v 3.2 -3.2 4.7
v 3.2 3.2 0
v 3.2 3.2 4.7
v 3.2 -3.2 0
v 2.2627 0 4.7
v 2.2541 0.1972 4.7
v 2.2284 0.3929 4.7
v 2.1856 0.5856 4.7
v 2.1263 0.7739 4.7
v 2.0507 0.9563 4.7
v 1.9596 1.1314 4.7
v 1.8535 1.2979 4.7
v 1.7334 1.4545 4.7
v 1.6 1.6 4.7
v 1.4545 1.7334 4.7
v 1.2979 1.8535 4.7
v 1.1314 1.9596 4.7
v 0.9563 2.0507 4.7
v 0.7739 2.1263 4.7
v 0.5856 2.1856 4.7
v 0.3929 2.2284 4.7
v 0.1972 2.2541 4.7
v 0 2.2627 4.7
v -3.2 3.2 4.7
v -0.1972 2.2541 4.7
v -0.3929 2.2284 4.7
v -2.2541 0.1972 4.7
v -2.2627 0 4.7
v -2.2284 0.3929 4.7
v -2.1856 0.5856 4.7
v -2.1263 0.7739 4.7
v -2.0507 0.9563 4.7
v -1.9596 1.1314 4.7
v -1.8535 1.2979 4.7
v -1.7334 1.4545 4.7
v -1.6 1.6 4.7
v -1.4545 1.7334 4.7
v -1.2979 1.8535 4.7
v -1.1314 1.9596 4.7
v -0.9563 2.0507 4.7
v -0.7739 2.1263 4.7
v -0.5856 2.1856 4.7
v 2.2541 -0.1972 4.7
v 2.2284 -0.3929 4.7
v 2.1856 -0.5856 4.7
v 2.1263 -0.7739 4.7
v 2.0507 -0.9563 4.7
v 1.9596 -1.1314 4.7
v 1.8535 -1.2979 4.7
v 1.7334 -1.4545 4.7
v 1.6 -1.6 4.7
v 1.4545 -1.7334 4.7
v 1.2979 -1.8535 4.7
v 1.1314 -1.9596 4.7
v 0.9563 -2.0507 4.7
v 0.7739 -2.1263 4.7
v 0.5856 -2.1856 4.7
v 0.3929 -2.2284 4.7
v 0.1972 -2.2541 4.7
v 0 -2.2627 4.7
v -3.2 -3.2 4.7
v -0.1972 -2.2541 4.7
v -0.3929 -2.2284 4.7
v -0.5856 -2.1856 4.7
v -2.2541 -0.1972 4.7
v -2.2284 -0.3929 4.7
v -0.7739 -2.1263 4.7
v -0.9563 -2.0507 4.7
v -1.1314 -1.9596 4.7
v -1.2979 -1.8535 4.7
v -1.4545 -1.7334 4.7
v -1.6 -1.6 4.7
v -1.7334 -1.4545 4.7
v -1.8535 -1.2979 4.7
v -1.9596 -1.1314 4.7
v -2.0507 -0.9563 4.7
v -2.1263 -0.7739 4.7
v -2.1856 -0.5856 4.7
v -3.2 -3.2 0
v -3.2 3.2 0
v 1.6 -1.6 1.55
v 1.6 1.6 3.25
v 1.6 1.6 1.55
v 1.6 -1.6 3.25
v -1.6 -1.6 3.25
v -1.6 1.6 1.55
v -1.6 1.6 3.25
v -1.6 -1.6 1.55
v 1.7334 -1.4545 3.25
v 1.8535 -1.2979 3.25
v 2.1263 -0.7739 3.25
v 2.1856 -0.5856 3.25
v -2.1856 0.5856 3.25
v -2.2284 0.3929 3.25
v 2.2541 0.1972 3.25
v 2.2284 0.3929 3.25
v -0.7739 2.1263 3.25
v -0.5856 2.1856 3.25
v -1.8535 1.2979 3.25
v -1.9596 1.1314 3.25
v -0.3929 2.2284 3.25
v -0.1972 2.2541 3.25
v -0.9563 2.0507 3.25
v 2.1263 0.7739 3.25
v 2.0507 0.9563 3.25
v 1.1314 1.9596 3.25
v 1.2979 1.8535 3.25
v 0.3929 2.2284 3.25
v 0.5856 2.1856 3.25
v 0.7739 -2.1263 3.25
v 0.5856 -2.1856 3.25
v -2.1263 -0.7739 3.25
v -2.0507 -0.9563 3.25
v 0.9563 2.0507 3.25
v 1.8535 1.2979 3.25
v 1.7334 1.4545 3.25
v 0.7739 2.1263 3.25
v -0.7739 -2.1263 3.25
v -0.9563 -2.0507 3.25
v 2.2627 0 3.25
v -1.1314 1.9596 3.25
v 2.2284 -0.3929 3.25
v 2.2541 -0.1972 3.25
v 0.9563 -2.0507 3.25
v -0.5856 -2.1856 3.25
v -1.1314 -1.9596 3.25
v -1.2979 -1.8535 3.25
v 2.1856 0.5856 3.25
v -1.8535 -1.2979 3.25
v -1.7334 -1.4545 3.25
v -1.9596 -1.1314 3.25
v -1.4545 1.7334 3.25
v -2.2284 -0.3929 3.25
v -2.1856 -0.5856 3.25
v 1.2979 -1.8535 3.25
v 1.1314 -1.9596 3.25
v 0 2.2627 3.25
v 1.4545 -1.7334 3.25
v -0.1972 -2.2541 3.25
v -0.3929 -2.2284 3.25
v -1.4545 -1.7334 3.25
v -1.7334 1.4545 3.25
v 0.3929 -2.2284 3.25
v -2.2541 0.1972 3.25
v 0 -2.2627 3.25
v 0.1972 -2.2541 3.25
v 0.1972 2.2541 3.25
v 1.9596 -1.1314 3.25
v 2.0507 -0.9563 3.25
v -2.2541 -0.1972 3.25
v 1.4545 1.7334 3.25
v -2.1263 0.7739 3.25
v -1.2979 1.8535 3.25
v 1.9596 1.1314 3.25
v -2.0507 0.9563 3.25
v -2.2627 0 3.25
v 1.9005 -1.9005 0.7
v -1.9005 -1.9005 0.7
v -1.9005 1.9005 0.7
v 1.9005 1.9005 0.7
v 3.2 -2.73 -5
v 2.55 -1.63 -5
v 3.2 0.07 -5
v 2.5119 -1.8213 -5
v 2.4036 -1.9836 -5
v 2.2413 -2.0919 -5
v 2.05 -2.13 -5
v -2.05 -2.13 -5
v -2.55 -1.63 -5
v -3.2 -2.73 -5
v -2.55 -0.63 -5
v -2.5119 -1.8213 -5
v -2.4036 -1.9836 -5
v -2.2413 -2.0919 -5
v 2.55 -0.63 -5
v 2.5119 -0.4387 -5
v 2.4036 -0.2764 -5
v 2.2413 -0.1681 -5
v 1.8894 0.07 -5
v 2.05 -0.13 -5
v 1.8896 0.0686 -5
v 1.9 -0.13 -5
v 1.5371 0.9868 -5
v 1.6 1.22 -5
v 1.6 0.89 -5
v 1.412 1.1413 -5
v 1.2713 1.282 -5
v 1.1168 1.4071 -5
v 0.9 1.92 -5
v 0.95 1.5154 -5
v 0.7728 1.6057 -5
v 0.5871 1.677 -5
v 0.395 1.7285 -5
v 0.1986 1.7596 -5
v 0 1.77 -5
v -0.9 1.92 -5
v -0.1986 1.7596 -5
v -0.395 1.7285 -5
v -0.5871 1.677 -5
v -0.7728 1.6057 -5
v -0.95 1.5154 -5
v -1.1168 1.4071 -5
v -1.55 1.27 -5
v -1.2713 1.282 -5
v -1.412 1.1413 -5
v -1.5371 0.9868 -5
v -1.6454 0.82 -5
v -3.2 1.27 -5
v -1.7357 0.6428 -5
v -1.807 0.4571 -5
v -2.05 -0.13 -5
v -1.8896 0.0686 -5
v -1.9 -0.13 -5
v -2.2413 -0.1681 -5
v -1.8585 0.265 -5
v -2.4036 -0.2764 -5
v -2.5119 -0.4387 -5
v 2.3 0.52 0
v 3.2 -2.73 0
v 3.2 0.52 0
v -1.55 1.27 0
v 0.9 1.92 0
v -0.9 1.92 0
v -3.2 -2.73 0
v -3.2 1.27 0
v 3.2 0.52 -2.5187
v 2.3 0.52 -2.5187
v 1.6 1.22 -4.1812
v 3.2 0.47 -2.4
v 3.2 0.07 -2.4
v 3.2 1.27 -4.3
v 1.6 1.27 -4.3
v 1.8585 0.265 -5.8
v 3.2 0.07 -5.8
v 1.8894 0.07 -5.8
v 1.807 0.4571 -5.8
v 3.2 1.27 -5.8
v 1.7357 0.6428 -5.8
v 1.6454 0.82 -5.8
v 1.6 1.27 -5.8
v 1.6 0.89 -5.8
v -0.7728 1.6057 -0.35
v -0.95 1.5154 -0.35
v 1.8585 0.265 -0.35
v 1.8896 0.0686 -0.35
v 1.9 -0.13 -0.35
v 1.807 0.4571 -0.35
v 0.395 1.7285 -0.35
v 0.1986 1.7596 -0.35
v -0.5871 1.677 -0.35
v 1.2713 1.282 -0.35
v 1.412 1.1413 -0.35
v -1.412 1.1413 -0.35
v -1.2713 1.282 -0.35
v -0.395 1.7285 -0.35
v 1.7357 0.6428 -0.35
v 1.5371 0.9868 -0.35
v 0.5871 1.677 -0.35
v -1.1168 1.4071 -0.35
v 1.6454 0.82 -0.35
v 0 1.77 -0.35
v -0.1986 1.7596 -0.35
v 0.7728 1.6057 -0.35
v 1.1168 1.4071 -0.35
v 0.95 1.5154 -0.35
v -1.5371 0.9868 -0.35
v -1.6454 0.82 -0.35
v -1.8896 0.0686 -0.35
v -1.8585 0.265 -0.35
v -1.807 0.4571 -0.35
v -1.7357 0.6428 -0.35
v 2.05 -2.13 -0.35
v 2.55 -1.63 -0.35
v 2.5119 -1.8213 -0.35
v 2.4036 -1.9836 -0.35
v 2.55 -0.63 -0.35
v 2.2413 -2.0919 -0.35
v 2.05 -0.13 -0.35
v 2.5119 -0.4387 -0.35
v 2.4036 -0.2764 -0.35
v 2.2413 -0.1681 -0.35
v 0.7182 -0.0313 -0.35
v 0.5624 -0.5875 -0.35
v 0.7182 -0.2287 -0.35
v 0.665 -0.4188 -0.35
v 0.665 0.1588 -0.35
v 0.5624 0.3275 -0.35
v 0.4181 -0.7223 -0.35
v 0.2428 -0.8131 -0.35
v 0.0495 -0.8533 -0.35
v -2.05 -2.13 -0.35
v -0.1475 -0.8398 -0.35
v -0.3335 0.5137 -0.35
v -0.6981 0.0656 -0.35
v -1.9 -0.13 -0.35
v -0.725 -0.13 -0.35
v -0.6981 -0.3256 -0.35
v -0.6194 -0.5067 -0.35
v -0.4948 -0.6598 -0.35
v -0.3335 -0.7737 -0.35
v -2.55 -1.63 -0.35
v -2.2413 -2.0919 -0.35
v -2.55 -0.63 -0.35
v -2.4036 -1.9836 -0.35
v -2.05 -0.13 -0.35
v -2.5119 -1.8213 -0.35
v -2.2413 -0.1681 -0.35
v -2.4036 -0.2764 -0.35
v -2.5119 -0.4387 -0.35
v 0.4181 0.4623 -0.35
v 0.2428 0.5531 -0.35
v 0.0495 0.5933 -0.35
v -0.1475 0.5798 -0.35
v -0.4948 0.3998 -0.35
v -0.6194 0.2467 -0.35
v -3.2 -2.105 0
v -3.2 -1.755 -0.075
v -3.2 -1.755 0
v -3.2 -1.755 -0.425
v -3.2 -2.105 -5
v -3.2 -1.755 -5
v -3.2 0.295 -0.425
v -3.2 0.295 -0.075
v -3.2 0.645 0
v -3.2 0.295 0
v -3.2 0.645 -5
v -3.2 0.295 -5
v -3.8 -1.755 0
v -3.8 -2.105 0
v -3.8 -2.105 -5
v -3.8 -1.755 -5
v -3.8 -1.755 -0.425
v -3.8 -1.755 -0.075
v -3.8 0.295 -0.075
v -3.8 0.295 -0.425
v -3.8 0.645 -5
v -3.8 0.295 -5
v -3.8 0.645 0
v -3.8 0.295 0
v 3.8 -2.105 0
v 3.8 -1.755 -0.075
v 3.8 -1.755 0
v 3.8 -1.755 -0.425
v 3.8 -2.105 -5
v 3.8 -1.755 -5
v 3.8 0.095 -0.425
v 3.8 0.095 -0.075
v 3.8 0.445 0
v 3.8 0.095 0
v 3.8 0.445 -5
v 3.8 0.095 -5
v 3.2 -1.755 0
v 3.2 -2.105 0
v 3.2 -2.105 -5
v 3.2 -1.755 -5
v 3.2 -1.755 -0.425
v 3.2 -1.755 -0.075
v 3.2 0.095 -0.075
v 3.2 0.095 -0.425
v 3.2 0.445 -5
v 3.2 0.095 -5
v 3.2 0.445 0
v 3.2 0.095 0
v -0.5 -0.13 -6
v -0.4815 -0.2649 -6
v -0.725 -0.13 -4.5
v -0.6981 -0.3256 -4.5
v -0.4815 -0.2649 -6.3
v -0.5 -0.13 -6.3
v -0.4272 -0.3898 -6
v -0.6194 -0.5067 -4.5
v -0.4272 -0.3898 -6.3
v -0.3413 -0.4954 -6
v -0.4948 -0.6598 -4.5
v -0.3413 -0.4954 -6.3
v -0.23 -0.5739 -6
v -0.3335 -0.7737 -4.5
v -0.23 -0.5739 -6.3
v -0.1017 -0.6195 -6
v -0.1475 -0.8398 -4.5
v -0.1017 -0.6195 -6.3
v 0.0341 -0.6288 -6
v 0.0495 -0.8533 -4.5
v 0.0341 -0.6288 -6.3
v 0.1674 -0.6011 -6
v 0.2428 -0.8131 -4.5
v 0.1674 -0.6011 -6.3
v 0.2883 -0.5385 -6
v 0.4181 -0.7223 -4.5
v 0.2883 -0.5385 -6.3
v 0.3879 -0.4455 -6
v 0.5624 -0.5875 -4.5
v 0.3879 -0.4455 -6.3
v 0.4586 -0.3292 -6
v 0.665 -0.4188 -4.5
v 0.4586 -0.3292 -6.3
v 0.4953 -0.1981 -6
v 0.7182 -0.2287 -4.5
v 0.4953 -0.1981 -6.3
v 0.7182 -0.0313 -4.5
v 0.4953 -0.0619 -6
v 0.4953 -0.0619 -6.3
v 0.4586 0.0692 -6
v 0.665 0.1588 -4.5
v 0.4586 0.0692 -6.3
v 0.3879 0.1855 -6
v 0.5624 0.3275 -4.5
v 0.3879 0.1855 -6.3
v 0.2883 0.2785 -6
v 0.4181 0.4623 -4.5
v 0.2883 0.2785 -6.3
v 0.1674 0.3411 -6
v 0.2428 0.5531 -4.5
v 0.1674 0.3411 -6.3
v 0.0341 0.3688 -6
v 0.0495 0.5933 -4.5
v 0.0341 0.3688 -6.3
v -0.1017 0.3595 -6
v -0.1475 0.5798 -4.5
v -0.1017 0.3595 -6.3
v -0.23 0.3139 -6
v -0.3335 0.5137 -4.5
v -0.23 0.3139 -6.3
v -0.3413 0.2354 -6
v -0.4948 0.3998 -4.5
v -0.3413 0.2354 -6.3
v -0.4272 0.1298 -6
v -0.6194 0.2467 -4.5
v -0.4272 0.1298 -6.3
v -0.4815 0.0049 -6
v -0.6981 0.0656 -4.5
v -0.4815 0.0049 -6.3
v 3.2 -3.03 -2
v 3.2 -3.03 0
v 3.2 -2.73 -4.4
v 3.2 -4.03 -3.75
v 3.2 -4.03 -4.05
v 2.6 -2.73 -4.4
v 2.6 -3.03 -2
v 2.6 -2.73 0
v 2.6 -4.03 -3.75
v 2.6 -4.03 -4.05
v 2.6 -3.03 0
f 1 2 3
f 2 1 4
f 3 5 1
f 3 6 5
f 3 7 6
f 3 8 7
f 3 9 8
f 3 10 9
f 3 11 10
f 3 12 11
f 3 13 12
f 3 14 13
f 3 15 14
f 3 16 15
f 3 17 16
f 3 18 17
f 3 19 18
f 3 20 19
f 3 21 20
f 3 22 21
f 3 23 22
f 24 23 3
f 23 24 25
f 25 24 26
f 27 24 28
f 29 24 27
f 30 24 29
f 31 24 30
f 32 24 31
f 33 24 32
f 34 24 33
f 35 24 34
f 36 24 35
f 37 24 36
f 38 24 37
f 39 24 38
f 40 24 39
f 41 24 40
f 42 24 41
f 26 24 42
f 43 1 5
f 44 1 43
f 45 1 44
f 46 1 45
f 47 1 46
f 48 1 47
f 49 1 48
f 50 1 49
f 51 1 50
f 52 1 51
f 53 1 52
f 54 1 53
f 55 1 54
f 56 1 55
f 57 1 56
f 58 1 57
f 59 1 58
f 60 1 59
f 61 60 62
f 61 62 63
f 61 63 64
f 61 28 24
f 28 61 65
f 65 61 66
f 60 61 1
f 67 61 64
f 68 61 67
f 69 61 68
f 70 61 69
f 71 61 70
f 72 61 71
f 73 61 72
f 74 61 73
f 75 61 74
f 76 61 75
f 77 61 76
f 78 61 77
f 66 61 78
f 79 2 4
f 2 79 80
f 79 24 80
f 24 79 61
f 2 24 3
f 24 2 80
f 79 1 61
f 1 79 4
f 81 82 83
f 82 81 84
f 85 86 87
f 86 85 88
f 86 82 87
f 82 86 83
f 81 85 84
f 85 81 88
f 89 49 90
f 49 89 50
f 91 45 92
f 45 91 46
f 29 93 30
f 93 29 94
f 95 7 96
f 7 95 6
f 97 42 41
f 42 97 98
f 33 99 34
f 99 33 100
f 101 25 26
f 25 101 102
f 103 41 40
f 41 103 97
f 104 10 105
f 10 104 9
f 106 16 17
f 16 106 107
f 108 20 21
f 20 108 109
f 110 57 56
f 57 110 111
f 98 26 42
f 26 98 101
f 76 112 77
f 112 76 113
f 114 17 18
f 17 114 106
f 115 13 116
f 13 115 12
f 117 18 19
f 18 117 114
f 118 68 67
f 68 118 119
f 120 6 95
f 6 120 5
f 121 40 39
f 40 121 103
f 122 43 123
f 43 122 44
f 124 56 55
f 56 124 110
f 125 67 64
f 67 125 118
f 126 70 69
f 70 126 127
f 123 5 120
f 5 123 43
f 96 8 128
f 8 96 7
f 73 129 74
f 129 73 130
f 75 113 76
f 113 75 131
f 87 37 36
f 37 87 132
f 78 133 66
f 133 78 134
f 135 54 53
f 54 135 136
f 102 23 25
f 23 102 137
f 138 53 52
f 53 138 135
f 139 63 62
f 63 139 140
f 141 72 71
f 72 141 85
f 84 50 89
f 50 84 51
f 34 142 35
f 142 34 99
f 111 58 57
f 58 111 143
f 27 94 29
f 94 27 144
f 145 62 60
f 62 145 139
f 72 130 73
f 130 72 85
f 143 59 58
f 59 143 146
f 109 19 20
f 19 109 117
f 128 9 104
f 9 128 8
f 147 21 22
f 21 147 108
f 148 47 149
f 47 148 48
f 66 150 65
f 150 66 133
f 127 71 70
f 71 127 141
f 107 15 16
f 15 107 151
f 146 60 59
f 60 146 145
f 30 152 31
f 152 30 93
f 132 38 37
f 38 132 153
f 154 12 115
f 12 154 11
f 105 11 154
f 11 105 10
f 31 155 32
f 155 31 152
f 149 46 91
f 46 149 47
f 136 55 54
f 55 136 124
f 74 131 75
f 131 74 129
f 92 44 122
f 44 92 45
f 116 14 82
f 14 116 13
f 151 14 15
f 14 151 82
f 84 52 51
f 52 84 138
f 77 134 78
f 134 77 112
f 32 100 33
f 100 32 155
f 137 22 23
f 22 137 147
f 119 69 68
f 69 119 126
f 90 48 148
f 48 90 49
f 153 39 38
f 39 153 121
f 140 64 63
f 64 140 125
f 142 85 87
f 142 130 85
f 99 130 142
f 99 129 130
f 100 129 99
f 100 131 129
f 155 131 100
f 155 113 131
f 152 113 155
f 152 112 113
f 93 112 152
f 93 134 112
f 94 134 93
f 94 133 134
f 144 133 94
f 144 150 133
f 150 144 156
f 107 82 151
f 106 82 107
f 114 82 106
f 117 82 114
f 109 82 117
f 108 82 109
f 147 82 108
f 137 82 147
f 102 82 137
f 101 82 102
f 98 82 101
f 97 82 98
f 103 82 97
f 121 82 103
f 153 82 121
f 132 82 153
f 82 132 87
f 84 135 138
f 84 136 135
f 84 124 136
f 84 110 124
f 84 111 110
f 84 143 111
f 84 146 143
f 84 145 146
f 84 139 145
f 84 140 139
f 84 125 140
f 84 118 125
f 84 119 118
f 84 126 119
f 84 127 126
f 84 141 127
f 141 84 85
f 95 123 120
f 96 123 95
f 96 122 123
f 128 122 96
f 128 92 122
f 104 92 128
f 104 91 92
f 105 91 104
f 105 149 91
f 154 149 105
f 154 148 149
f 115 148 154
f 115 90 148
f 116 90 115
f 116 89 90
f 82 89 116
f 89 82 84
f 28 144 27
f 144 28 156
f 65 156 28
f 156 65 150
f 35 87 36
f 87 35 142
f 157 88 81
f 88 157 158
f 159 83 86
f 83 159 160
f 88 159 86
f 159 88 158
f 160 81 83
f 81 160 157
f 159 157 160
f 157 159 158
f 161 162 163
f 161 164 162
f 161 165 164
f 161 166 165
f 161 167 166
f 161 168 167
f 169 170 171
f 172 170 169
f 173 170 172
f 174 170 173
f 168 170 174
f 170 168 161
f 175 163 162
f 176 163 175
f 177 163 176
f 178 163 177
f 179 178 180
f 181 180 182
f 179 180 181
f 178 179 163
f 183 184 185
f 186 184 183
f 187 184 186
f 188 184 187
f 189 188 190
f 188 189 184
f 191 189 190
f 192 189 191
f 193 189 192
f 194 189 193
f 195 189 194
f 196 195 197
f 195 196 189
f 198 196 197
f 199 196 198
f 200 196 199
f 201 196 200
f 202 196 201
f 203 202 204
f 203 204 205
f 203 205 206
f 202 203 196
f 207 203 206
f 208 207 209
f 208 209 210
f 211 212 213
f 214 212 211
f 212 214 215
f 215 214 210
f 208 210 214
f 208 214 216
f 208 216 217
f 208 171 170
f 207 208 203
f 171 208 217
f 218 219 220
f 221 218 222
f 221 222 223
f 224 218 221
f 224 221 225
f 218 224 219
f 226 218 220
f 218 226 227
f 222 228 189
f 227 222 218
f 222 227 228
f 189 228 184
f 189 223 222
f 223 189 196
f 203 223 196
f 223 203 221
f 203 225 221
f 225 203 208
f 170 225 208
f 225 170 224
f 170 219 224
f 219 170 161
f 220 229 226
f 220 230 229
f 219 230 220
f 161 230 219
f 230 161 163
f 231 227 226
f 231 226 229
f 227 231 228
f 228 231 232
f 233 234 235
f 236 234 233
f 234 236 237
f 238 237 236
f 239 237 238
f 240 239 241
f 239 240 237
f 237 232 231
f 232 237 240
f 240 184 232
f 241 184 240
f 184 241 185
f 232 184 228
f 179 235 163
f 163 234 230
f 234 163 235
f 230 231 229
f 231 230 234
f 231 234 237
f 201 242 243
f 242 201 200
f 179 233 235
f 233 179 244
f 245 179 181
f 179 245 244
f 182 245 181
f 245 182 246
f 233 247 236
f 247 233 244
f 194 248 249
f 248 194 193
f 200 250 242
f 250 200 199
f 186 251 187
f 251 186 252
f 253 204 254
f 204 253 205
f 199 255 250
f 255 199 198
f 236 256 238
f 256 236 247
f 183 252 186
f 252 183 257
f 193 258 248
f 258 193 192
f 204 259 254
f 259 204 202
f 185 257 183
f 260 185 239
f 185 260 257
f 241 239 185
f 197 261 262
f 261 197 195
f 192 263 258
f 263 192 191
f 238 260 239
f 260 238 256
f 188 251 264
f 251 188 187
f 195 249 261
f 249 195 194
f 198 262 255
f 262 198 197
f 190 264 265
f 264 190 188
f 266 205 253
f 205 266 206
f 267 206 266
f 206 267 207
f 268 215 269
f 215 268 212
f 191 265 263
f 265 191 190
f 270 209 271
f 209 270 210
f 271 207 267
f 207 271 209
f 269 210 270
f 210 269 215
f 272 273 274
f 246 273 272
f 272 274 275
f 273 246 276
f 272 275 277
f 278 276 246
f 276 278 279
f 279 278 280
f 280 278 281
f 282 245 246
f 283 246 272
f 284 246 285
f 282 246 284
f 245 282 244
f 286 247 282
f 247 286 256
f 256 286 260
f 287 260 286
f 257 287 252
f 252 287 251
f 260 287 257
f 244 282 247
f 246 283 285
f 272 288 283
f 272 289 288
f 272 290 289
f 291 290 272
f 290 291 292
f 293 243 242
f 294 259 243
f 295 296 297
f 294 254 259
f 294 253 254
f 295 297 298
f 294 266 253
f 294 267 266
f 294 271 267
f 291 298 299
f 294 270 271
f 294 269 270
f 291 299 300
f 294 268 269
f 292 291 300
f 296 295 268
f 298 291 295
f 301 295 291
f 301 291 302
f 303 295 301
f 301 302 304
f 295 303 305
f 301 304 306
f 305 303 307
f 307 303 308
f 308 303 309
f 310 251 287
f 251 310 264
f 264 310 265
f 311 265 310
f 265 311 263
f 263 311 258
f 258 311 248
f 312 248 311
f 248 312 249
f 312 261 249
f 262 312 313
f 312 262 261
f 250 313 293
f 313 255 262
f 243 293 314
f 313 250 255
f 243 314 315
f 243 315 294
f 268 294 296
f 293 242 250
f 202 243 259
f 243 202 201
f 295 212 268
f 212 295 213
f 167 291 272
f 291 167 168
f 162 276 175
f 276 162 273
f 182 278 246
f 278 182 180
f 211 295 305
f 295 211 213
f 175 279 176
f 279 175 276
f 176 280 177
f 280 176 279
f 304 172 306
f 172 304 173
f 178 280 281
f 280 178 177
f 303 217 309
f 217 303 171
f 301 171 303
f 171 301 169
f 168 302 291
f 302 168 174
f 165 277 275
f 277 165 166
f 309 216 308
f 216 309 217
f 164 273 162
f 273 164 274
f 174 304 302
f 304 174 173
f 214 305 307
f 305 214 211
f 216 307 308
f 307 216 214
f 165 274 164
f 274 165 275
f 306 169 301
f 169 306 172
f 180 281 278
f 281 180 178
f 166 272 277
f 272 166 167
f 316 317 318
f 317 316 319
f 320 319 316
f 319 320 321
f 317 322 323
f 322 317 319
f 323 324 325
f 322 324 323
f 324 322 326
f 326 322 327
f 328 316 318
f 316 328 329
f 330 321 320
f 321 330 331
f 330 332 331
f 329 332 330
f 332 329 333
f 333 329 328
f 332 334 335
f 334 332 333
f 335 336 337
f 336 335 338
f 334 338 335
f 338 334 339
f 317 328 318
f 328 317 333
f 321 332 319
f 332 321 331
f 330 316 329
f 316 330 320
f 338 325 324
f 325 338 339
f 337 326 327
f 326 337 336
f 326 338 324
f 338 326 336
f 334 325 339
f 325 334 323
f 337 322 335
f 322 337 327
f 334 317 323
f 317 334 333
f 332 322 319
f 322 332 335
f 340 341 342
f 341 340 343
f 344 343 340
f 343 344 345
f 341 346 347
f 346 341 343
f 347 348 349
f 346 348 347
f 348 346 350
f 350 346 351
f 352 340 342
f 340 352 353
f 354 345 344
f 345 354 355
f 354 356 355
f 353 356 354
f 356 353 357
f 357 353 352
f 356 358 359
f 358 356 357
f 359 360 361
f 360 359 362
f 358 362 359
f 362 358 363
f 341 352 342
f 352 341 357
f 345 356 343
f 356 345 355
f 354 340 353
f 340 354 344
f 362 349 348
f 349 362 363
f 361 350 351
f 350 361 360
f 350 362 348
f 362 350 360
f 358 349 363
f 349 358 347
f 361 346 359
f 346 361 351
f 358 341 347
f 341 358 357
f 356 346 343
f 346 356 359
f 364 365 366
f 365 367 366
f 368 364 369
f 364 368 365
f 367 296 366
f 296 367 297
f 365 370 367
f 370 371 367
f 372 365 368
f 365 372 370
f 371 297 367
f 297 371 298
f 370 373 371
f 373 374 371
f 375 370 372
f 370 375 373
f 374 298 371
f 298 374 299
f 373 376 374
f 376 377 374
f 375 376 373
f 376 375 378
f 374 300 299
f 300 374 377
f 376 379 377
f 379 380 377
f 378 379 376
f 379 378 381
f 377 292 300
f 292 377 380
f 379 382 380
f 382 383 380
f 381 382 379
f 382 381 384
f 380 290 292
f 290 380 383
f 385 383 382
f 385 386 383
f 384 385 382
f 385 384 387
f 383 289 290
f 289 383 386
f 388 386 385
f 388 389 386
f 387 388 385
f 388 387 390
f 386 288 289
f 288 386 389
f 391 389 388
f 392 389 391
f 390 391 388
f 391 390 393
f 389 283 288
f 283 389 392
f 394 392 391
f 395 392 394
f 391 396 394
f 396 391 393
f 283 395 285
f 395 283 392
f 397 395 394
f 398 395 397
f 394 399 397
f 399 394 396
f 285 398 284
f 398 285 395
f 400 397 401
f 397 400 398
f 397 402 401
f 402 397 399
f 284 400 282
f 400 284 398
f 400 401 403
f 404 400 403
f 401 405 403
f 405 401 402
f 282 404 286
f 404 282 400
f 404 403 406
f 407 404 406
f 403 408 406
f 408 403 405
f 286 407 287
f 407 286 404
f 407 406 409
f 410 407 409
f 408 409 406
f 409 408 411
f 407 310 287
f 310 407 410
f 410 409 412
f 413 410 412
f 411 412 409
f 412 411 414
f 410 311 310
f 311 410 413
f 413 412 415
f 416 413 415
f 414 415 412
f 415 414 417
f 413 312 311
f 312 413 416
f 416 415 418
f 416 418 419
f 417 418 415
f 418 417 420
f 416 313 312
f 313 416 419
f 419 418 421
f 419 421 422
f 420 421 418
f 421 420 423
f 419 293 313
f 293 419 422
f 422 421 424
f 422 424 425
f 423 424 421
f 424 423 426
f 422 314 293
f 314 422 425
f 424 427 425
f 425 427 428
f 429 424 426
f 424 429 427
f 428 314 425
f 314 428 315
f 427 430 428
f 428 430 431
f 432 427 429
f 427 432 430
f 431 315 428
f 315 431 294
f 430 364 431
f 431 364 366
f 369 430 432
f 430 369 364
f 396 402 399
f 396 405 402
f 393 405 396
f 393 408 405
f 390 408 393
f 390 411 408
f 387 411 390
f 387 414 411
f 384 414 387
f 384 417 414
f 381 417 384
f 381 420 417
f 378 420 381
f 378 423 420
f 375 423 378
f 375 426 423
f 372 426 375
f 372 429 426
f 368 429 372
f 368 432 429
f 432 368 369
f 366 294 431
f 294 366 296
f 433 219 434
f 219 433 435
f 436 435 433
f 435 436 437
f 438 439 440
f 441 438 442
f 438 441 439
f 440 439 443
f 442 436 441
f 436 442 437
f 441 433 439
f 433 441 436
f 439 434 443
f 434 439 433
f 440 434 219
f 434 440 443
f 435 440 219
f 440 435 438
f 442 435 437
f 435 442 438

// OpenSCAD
$fa = 1;
$fs = 0.2;

// Cap type
cap_type = "Atari XE ■"; // [KailhBox, Atari XE ■, Atari XE ◎]

// Stem type
stem_type = "KailhBoxPink"; // [KailhBoxPink]

// Revision
rev = "10";

// Carve revision
carve_rev = false;

module nil() {}

box_width = 6.40;
box_height = 4.7;
box_inner_width = 6;
box_inner_corner_radius = 2;
box_cross_x_thickness = 1.3;
box_cross_y_thickness = 1.1;
box_cross_width = 4;
box_bottom_thickness = 0.7;
box_bottom_outer_offset = 0.02;
extra_floor = 1;

module kailh_box() {
  union() {
    difference() {
      cube([box_width, box_width, box_height], center = true);
      minkowski() {
        cube([
          box_inner_width - box_inner_corner_radius * 2,
          box_inner_width - box_inner_corner_radius * 2,
          box_height + 0.1], center = true);
        cylinder(r = box_inner_corner_radius);
      }
    };
    cube([box_cross_width, box_cross_x_thickness, box_height], center = true);
    cube([box_cross_y_thickness, box_cross_width, box_height], center = true);
    translate([0, 0, (box_bottom_thickness - box_height) / 2])
      cube([box_width, box_width, box_bottom_thickness], center = true);
  }
}

atari_box_width = 6.40;
atari_box_height = 4.7;
atari_square_width = 3.2;
atari_square_depth = 2.8;
atari_square_circle_radius = atari_square_width * sqrt(2) / 2;
atari_circle_inner_diameter = 4.3;
atari_circle_wing_thickness = 1.45;
atari_circle_depth = 4.0;
atari_box_bottom_thickness = 0.7;
atari_box_bottom_outer_offset = 0.05;

module atarixe_square() {
  union() {
    difference() {
      cube([atari_box_width, atari_box_width, atari_box_height], center = true);
      cube([atari_square_width, atari_square_width, atari_box_height + 0.1], center = true);
      translate([0, 0, (atari_square_depth - 1) / 2])
        cylinder(r = atari_square_circle_radius, h = atari_box_height - atari_square_depth + 0.1);
      // Add a recess at the bottom so if resin residues cling in the angles, they do so without preventing the cap from going in completely.
      rotate([0, 0, 45])
        translate([0, 0, 1 - atari_square_depth])
          cylinder(h = 1, d1 = atari_square_circle_radius * 2 + 1, d2 = atari_square_circle_radius * 2, $fn = 4);
    }
    translate([0, 0, (atari_box_bottom_thickness - atari_box_height) / 2])
      cube([atari_box_width, atari_box_width, atari_box_bottom_thickness], center = true);
  }
}

module atarixe_circle() {
  union() {
    cylinder(r = atari_circle_inner_diameter / 2, h = atari_circle_depth + extra_floor);
    translate([0, 0, (atari_circle_depth + extra_floor) / 2])
      cube([atari_circle_wing_thickness, atari_box_width - 0.2, atari_circle_depth + extra_floor], center = true);
  }
}

kailh_stem_horizontal_offset = 0.47;
kailh_stem_spring_column_height = 6.3;
kailh_stem_spring_column_bottom_diameter = 1.45;
kailh_stem_spring_column_upper_diameter = 1;
kailh_stem_spring_column_top_height = 0.3;
kailh_stem_spring_column_cone_height = 1.5;
kailh_stem_spring_column_offset = -0.60;
kailh_stem_main_height = 5;
kailh_stem_main_width = box_width;
kailh_stem_main_depth_left = 4.0;
kailh_stem_main_depth_middle = 4.65;
kailh_stem_main_depth_right = 3.25;
kailh_stem_main_extension_width = 1.8;
kailh_stem_main_hole_diameter = 3.8;
kailh_stem_main_hole_width = 5.1;
kailh_stem_main_hole_depth = 2;
kailh_stem_main_hole_corner_radius = 0.5;
kailh_stem_rail_thickness = 0.6;
kailh_stem_rail_width = 0.35;
kailh_stem_left_rail1_x = 0.8;
kailh_stem_left_rail2_x = 3.2;
kailh_stem_left_rail3_y = 2.9;
kailh_stem_right_rail1_x = 0.8;
kailh_stem_right_rail2_x = 3.0;
kailh_stem_right_rail3_y = 2.9;
kailh_clicker_top_height = 1.3;
kailh_clicker_top_length = 0.3;
kailh_clicker_rail_height = 0.3;
kailh_clicker_gentle_slope_length = 1.75;
kailh_clicker_steep_slope_length = 0.35;
kailh_clicker_flat_length = 2;
kailh_clicker_rail_width = 0.6;
kailh_breaker_width = 1.6;
kailh_breaker_flat_length = 1.5;
kailh_breaker_slope_length = 1.9;
kailh_breaker_top = 0.8;
kailh_breaker_outcrop = 0.8;
kailh_breaker_bottom = -0.4;

kailh_stem_height = kailh_stem_spring_column_height;

module kailh_rails(rail1_x, rail2_x, rail3_y, rail_width, rail_thickness) {
  translate([0, rail1_x, (kailh_stem_spring_column_height - kailh_stem_main_height) / 2])
    cube([rail_thickness, rail_width, kailh_stem_main_height], center = true);
  translate([0, rail2_x, (kailh_stem_spring_column_height - kailh_stem_main_height) / 2])
    cube([rail_thickness, rail_width, kailh_stem_main_height], center = true);
  translate([0, (rail2_x + rail1_x) / 2, rail3_y])
    cube([rail_thickness, rail2_x - rail1_x - rail_width, rail_width], center = true);
}

module kailh_stem() {
  union() {
    // Main part
    translate([0, 0, (kailh_stem_spring_column_height - kailh_stem_main_height) / 2])
      difference() {
        union() {
          linear_extrude(height = kailh_stem_main_height, center = true) {
            polygon(points = [
              [-kailh_stem_main_width / 2, -box_width / 2],
              [kailh_stem_main_width / 2, -box_width / 2],
              [kailh_stem_main_width / 2, kailh_stem_main_depth_right - box_width / 2],
              [kailh_stem_main_extension_width / 2 + (kailh_stem_main_depth_middle - kailh_stem_main_depth_right), kailh_stem_main_depth_right - box_width / 2],
              [kailh_stem_main_extension_width / 2, kailh_stem_main_depth_middle - box_width / 2],
              [-kailh_stem_main_extension_width / 2, kailh_stem_main_depth_middle - box_width / 2],
              [-kailh_stem_main_extension_width / 2 - (kailh_stem_main_depth_middle - kailh_stem_main_depth_left), kailh_stem_main_depth_left - box_width / 2],
              [-kailh_stem_main_width / 2, kailh_stem_main_depth_left - box_width / 2],
            ], convexity = 10);
          }
          // Contact breaker
          kailh_breaker_height = kailh_breaker_slope_length + kailh_breaker_flat_length;
          translate([kailh_stem_main_width / 2, 0, kailh_breaker_height - kailh_stem_main_height / 2 - kailh_breaker_outcrop])
            rotate([-90, 0, 90])
              linear_extrude(height = kailh_breaker_width) {
                polygon(points = [
                  [kailh_breaker_bottom, 0],
                  [0, 0],
                  [kailh_breaker_top, kailh_breaker_slope_length],
                  [kailh_breaker_top, kailh_breaker_height],
                  [kailh_breaker_bottom, kailh_breaker_height]
                ], convexity = 4);
              }
        }
        translate([0, kailh_stem_spring_column_offset, 0])
          union() {
            translate([0, 0, -extra_floor/2 - 0.5])
              cylinder(r = kailh_stem_main_hole_diameter / 2, h = kailh_stem_height - extra_floor + 1, center = true);
            hull() {
              translate([kailh_stem_main_hole_corner_radius - kailh_stem_main_hole_width / 2, -kailh_stem_main_hole_corner_radius, -extra_floor])
                cylinder(r = kailh_stem_main_hole_corner_radius, h = kailh_stem_height - extra_floor + 1, center = true);
              translate([kailh_stem_main_hole_width / 2 - kailh_stem_main_hole_corner_radius, -kailh_stem_main_hole_corner_radius, -extra_floor])
                cylinder(r = kailh_stem_main_hole_corner_radius, h = kailh_stem_height - extra_floor + 1, center = true);
              translate([kailh_stem_main_hole_corner_radius - kailh_stem_main_hole_width / 2, kailh_stem_main_hole_corner_radius - kailh_stem_main_hole_depth, -extra_floor])
                cylinder(r = kailh_stem_main_hole_corner_radius, h = kailh_stem_height - extra_floor + 1, center = true);
              translate([kailh_stem_main_hole_width / 2 - kailh_stem_main_hole_corner_radius, kailh_stem_main_hole_corner_radius - kailh_stem_main_hole_depth, -extra_floor])
                cylinder(r = kailh_stem_main_hole_corner_radius, h = kailh_stem_height - extra_floor + 1, center = true);
            }
          }
        // Revision number
        if (carve_rev) {
          translate([2.2, -box_width / 2 + 0.2, 2])
            rotate([90, 180, 0])
              linear_extrude(height = 0.4)
                text(rev, size = 3);
        }
      }
    // Spring cone
    translate([0, kailh_stem_spring_column_offset, kailh_stem_spring_column_height / 2])
      rotate([180, 0, 0])
        rotate_extrude()
          polygon(points = [
            [0, 0],
            [kailh_stem_spring_column_bottom_diameter / 2, 0],
            [kailh_stem_spring_column_bottom_diameter / 2, kailh_stem_spring_column_height - kailh_stem_spring_column_cone_height - kailh_stem_spring_column_top_height],
            [kailh_stem_spring_column_upper_diameter / 2, kailh_stem_spring_column_height - kailh_stem_spring_column_top_height],
            [kailh_stem_spring_column_upper_diameter / 2, kailh_stem_spring_column_height],
            [0, kailh_stem_spring_column_height]
          ], convexity = 4);
    // Rails
    translate([-(kailh_stem_main_width + kailh_stem_rail_thickness) / 2, -kailh_stem_main_width / 2, 0])
      kailh_rails(kailh_stem_left_rail1_x, kailh_stem_left_rail2_x, kailh_stem_left_rail3_y, kailh_stem_rail_width, kailh_stem_rail_thickness);
    translate([(kailh_stem_main_width + kailh_stem_rail_thickness) / 2, -kailh_stem_main_width / 2, 0])
      kailh_rails(kailh_stem_right_rail1_x, kailh_stem_right_rail2_x, kailh_stem_right_rail3_y, kailh_stem_rail_width, kailh_stem_rail_thickness);
    // Clicker
    kailh_clicker_height = kailh_clicker_flat_length + kailh_clicker_gentle_slope_length + kailh_clicker_top_length + kailh_clicker_steep_slope_length;
    translate([kailh_stem_main_width / 2, -box_width / 2, kailh_stem_height / 2])
      rotate([0, 90, 180])
        linear_extrude(height = kailh_clicker_rail_width) {
          polygon(points = [
            [0, 0],
            [0, kailh_clicker_rail_height],
            [kailh_clicker_flat_length, kailh_clicker_rail_height],
            [kailh_clicker_flat_length + kailh_clicker_gentle_slope_length, kailh_clicker_top_height],
            [kailh_clicker_flat_length + kailh_clicker_gentle_slope_length + kailh_clicker_top_length, kailh_clicker_top_height],
            [kailh_clicker_height, 0]
          ], convexity = 4);
      }
  }
}

union() {
  if (cap_type == "KailhBox") {
    translate([0, 0, box_height / 2])
      kailh_box();
  }
  if (cap_type == "Atari XE ■") {
    translate([0, 0, atari_box_height / 2])
      atarixe_square();
  }
  if (cap_type == "Atari XE ◎") {
    extra_floor = 1;
    atarixe_circle();
  }
  if (stem_type == "KailhBoxPink") {
    translate([0, kailh_stem_horizontal_offset, -kailh_stem_height / 2])
      kailh_stem();
  }
}
